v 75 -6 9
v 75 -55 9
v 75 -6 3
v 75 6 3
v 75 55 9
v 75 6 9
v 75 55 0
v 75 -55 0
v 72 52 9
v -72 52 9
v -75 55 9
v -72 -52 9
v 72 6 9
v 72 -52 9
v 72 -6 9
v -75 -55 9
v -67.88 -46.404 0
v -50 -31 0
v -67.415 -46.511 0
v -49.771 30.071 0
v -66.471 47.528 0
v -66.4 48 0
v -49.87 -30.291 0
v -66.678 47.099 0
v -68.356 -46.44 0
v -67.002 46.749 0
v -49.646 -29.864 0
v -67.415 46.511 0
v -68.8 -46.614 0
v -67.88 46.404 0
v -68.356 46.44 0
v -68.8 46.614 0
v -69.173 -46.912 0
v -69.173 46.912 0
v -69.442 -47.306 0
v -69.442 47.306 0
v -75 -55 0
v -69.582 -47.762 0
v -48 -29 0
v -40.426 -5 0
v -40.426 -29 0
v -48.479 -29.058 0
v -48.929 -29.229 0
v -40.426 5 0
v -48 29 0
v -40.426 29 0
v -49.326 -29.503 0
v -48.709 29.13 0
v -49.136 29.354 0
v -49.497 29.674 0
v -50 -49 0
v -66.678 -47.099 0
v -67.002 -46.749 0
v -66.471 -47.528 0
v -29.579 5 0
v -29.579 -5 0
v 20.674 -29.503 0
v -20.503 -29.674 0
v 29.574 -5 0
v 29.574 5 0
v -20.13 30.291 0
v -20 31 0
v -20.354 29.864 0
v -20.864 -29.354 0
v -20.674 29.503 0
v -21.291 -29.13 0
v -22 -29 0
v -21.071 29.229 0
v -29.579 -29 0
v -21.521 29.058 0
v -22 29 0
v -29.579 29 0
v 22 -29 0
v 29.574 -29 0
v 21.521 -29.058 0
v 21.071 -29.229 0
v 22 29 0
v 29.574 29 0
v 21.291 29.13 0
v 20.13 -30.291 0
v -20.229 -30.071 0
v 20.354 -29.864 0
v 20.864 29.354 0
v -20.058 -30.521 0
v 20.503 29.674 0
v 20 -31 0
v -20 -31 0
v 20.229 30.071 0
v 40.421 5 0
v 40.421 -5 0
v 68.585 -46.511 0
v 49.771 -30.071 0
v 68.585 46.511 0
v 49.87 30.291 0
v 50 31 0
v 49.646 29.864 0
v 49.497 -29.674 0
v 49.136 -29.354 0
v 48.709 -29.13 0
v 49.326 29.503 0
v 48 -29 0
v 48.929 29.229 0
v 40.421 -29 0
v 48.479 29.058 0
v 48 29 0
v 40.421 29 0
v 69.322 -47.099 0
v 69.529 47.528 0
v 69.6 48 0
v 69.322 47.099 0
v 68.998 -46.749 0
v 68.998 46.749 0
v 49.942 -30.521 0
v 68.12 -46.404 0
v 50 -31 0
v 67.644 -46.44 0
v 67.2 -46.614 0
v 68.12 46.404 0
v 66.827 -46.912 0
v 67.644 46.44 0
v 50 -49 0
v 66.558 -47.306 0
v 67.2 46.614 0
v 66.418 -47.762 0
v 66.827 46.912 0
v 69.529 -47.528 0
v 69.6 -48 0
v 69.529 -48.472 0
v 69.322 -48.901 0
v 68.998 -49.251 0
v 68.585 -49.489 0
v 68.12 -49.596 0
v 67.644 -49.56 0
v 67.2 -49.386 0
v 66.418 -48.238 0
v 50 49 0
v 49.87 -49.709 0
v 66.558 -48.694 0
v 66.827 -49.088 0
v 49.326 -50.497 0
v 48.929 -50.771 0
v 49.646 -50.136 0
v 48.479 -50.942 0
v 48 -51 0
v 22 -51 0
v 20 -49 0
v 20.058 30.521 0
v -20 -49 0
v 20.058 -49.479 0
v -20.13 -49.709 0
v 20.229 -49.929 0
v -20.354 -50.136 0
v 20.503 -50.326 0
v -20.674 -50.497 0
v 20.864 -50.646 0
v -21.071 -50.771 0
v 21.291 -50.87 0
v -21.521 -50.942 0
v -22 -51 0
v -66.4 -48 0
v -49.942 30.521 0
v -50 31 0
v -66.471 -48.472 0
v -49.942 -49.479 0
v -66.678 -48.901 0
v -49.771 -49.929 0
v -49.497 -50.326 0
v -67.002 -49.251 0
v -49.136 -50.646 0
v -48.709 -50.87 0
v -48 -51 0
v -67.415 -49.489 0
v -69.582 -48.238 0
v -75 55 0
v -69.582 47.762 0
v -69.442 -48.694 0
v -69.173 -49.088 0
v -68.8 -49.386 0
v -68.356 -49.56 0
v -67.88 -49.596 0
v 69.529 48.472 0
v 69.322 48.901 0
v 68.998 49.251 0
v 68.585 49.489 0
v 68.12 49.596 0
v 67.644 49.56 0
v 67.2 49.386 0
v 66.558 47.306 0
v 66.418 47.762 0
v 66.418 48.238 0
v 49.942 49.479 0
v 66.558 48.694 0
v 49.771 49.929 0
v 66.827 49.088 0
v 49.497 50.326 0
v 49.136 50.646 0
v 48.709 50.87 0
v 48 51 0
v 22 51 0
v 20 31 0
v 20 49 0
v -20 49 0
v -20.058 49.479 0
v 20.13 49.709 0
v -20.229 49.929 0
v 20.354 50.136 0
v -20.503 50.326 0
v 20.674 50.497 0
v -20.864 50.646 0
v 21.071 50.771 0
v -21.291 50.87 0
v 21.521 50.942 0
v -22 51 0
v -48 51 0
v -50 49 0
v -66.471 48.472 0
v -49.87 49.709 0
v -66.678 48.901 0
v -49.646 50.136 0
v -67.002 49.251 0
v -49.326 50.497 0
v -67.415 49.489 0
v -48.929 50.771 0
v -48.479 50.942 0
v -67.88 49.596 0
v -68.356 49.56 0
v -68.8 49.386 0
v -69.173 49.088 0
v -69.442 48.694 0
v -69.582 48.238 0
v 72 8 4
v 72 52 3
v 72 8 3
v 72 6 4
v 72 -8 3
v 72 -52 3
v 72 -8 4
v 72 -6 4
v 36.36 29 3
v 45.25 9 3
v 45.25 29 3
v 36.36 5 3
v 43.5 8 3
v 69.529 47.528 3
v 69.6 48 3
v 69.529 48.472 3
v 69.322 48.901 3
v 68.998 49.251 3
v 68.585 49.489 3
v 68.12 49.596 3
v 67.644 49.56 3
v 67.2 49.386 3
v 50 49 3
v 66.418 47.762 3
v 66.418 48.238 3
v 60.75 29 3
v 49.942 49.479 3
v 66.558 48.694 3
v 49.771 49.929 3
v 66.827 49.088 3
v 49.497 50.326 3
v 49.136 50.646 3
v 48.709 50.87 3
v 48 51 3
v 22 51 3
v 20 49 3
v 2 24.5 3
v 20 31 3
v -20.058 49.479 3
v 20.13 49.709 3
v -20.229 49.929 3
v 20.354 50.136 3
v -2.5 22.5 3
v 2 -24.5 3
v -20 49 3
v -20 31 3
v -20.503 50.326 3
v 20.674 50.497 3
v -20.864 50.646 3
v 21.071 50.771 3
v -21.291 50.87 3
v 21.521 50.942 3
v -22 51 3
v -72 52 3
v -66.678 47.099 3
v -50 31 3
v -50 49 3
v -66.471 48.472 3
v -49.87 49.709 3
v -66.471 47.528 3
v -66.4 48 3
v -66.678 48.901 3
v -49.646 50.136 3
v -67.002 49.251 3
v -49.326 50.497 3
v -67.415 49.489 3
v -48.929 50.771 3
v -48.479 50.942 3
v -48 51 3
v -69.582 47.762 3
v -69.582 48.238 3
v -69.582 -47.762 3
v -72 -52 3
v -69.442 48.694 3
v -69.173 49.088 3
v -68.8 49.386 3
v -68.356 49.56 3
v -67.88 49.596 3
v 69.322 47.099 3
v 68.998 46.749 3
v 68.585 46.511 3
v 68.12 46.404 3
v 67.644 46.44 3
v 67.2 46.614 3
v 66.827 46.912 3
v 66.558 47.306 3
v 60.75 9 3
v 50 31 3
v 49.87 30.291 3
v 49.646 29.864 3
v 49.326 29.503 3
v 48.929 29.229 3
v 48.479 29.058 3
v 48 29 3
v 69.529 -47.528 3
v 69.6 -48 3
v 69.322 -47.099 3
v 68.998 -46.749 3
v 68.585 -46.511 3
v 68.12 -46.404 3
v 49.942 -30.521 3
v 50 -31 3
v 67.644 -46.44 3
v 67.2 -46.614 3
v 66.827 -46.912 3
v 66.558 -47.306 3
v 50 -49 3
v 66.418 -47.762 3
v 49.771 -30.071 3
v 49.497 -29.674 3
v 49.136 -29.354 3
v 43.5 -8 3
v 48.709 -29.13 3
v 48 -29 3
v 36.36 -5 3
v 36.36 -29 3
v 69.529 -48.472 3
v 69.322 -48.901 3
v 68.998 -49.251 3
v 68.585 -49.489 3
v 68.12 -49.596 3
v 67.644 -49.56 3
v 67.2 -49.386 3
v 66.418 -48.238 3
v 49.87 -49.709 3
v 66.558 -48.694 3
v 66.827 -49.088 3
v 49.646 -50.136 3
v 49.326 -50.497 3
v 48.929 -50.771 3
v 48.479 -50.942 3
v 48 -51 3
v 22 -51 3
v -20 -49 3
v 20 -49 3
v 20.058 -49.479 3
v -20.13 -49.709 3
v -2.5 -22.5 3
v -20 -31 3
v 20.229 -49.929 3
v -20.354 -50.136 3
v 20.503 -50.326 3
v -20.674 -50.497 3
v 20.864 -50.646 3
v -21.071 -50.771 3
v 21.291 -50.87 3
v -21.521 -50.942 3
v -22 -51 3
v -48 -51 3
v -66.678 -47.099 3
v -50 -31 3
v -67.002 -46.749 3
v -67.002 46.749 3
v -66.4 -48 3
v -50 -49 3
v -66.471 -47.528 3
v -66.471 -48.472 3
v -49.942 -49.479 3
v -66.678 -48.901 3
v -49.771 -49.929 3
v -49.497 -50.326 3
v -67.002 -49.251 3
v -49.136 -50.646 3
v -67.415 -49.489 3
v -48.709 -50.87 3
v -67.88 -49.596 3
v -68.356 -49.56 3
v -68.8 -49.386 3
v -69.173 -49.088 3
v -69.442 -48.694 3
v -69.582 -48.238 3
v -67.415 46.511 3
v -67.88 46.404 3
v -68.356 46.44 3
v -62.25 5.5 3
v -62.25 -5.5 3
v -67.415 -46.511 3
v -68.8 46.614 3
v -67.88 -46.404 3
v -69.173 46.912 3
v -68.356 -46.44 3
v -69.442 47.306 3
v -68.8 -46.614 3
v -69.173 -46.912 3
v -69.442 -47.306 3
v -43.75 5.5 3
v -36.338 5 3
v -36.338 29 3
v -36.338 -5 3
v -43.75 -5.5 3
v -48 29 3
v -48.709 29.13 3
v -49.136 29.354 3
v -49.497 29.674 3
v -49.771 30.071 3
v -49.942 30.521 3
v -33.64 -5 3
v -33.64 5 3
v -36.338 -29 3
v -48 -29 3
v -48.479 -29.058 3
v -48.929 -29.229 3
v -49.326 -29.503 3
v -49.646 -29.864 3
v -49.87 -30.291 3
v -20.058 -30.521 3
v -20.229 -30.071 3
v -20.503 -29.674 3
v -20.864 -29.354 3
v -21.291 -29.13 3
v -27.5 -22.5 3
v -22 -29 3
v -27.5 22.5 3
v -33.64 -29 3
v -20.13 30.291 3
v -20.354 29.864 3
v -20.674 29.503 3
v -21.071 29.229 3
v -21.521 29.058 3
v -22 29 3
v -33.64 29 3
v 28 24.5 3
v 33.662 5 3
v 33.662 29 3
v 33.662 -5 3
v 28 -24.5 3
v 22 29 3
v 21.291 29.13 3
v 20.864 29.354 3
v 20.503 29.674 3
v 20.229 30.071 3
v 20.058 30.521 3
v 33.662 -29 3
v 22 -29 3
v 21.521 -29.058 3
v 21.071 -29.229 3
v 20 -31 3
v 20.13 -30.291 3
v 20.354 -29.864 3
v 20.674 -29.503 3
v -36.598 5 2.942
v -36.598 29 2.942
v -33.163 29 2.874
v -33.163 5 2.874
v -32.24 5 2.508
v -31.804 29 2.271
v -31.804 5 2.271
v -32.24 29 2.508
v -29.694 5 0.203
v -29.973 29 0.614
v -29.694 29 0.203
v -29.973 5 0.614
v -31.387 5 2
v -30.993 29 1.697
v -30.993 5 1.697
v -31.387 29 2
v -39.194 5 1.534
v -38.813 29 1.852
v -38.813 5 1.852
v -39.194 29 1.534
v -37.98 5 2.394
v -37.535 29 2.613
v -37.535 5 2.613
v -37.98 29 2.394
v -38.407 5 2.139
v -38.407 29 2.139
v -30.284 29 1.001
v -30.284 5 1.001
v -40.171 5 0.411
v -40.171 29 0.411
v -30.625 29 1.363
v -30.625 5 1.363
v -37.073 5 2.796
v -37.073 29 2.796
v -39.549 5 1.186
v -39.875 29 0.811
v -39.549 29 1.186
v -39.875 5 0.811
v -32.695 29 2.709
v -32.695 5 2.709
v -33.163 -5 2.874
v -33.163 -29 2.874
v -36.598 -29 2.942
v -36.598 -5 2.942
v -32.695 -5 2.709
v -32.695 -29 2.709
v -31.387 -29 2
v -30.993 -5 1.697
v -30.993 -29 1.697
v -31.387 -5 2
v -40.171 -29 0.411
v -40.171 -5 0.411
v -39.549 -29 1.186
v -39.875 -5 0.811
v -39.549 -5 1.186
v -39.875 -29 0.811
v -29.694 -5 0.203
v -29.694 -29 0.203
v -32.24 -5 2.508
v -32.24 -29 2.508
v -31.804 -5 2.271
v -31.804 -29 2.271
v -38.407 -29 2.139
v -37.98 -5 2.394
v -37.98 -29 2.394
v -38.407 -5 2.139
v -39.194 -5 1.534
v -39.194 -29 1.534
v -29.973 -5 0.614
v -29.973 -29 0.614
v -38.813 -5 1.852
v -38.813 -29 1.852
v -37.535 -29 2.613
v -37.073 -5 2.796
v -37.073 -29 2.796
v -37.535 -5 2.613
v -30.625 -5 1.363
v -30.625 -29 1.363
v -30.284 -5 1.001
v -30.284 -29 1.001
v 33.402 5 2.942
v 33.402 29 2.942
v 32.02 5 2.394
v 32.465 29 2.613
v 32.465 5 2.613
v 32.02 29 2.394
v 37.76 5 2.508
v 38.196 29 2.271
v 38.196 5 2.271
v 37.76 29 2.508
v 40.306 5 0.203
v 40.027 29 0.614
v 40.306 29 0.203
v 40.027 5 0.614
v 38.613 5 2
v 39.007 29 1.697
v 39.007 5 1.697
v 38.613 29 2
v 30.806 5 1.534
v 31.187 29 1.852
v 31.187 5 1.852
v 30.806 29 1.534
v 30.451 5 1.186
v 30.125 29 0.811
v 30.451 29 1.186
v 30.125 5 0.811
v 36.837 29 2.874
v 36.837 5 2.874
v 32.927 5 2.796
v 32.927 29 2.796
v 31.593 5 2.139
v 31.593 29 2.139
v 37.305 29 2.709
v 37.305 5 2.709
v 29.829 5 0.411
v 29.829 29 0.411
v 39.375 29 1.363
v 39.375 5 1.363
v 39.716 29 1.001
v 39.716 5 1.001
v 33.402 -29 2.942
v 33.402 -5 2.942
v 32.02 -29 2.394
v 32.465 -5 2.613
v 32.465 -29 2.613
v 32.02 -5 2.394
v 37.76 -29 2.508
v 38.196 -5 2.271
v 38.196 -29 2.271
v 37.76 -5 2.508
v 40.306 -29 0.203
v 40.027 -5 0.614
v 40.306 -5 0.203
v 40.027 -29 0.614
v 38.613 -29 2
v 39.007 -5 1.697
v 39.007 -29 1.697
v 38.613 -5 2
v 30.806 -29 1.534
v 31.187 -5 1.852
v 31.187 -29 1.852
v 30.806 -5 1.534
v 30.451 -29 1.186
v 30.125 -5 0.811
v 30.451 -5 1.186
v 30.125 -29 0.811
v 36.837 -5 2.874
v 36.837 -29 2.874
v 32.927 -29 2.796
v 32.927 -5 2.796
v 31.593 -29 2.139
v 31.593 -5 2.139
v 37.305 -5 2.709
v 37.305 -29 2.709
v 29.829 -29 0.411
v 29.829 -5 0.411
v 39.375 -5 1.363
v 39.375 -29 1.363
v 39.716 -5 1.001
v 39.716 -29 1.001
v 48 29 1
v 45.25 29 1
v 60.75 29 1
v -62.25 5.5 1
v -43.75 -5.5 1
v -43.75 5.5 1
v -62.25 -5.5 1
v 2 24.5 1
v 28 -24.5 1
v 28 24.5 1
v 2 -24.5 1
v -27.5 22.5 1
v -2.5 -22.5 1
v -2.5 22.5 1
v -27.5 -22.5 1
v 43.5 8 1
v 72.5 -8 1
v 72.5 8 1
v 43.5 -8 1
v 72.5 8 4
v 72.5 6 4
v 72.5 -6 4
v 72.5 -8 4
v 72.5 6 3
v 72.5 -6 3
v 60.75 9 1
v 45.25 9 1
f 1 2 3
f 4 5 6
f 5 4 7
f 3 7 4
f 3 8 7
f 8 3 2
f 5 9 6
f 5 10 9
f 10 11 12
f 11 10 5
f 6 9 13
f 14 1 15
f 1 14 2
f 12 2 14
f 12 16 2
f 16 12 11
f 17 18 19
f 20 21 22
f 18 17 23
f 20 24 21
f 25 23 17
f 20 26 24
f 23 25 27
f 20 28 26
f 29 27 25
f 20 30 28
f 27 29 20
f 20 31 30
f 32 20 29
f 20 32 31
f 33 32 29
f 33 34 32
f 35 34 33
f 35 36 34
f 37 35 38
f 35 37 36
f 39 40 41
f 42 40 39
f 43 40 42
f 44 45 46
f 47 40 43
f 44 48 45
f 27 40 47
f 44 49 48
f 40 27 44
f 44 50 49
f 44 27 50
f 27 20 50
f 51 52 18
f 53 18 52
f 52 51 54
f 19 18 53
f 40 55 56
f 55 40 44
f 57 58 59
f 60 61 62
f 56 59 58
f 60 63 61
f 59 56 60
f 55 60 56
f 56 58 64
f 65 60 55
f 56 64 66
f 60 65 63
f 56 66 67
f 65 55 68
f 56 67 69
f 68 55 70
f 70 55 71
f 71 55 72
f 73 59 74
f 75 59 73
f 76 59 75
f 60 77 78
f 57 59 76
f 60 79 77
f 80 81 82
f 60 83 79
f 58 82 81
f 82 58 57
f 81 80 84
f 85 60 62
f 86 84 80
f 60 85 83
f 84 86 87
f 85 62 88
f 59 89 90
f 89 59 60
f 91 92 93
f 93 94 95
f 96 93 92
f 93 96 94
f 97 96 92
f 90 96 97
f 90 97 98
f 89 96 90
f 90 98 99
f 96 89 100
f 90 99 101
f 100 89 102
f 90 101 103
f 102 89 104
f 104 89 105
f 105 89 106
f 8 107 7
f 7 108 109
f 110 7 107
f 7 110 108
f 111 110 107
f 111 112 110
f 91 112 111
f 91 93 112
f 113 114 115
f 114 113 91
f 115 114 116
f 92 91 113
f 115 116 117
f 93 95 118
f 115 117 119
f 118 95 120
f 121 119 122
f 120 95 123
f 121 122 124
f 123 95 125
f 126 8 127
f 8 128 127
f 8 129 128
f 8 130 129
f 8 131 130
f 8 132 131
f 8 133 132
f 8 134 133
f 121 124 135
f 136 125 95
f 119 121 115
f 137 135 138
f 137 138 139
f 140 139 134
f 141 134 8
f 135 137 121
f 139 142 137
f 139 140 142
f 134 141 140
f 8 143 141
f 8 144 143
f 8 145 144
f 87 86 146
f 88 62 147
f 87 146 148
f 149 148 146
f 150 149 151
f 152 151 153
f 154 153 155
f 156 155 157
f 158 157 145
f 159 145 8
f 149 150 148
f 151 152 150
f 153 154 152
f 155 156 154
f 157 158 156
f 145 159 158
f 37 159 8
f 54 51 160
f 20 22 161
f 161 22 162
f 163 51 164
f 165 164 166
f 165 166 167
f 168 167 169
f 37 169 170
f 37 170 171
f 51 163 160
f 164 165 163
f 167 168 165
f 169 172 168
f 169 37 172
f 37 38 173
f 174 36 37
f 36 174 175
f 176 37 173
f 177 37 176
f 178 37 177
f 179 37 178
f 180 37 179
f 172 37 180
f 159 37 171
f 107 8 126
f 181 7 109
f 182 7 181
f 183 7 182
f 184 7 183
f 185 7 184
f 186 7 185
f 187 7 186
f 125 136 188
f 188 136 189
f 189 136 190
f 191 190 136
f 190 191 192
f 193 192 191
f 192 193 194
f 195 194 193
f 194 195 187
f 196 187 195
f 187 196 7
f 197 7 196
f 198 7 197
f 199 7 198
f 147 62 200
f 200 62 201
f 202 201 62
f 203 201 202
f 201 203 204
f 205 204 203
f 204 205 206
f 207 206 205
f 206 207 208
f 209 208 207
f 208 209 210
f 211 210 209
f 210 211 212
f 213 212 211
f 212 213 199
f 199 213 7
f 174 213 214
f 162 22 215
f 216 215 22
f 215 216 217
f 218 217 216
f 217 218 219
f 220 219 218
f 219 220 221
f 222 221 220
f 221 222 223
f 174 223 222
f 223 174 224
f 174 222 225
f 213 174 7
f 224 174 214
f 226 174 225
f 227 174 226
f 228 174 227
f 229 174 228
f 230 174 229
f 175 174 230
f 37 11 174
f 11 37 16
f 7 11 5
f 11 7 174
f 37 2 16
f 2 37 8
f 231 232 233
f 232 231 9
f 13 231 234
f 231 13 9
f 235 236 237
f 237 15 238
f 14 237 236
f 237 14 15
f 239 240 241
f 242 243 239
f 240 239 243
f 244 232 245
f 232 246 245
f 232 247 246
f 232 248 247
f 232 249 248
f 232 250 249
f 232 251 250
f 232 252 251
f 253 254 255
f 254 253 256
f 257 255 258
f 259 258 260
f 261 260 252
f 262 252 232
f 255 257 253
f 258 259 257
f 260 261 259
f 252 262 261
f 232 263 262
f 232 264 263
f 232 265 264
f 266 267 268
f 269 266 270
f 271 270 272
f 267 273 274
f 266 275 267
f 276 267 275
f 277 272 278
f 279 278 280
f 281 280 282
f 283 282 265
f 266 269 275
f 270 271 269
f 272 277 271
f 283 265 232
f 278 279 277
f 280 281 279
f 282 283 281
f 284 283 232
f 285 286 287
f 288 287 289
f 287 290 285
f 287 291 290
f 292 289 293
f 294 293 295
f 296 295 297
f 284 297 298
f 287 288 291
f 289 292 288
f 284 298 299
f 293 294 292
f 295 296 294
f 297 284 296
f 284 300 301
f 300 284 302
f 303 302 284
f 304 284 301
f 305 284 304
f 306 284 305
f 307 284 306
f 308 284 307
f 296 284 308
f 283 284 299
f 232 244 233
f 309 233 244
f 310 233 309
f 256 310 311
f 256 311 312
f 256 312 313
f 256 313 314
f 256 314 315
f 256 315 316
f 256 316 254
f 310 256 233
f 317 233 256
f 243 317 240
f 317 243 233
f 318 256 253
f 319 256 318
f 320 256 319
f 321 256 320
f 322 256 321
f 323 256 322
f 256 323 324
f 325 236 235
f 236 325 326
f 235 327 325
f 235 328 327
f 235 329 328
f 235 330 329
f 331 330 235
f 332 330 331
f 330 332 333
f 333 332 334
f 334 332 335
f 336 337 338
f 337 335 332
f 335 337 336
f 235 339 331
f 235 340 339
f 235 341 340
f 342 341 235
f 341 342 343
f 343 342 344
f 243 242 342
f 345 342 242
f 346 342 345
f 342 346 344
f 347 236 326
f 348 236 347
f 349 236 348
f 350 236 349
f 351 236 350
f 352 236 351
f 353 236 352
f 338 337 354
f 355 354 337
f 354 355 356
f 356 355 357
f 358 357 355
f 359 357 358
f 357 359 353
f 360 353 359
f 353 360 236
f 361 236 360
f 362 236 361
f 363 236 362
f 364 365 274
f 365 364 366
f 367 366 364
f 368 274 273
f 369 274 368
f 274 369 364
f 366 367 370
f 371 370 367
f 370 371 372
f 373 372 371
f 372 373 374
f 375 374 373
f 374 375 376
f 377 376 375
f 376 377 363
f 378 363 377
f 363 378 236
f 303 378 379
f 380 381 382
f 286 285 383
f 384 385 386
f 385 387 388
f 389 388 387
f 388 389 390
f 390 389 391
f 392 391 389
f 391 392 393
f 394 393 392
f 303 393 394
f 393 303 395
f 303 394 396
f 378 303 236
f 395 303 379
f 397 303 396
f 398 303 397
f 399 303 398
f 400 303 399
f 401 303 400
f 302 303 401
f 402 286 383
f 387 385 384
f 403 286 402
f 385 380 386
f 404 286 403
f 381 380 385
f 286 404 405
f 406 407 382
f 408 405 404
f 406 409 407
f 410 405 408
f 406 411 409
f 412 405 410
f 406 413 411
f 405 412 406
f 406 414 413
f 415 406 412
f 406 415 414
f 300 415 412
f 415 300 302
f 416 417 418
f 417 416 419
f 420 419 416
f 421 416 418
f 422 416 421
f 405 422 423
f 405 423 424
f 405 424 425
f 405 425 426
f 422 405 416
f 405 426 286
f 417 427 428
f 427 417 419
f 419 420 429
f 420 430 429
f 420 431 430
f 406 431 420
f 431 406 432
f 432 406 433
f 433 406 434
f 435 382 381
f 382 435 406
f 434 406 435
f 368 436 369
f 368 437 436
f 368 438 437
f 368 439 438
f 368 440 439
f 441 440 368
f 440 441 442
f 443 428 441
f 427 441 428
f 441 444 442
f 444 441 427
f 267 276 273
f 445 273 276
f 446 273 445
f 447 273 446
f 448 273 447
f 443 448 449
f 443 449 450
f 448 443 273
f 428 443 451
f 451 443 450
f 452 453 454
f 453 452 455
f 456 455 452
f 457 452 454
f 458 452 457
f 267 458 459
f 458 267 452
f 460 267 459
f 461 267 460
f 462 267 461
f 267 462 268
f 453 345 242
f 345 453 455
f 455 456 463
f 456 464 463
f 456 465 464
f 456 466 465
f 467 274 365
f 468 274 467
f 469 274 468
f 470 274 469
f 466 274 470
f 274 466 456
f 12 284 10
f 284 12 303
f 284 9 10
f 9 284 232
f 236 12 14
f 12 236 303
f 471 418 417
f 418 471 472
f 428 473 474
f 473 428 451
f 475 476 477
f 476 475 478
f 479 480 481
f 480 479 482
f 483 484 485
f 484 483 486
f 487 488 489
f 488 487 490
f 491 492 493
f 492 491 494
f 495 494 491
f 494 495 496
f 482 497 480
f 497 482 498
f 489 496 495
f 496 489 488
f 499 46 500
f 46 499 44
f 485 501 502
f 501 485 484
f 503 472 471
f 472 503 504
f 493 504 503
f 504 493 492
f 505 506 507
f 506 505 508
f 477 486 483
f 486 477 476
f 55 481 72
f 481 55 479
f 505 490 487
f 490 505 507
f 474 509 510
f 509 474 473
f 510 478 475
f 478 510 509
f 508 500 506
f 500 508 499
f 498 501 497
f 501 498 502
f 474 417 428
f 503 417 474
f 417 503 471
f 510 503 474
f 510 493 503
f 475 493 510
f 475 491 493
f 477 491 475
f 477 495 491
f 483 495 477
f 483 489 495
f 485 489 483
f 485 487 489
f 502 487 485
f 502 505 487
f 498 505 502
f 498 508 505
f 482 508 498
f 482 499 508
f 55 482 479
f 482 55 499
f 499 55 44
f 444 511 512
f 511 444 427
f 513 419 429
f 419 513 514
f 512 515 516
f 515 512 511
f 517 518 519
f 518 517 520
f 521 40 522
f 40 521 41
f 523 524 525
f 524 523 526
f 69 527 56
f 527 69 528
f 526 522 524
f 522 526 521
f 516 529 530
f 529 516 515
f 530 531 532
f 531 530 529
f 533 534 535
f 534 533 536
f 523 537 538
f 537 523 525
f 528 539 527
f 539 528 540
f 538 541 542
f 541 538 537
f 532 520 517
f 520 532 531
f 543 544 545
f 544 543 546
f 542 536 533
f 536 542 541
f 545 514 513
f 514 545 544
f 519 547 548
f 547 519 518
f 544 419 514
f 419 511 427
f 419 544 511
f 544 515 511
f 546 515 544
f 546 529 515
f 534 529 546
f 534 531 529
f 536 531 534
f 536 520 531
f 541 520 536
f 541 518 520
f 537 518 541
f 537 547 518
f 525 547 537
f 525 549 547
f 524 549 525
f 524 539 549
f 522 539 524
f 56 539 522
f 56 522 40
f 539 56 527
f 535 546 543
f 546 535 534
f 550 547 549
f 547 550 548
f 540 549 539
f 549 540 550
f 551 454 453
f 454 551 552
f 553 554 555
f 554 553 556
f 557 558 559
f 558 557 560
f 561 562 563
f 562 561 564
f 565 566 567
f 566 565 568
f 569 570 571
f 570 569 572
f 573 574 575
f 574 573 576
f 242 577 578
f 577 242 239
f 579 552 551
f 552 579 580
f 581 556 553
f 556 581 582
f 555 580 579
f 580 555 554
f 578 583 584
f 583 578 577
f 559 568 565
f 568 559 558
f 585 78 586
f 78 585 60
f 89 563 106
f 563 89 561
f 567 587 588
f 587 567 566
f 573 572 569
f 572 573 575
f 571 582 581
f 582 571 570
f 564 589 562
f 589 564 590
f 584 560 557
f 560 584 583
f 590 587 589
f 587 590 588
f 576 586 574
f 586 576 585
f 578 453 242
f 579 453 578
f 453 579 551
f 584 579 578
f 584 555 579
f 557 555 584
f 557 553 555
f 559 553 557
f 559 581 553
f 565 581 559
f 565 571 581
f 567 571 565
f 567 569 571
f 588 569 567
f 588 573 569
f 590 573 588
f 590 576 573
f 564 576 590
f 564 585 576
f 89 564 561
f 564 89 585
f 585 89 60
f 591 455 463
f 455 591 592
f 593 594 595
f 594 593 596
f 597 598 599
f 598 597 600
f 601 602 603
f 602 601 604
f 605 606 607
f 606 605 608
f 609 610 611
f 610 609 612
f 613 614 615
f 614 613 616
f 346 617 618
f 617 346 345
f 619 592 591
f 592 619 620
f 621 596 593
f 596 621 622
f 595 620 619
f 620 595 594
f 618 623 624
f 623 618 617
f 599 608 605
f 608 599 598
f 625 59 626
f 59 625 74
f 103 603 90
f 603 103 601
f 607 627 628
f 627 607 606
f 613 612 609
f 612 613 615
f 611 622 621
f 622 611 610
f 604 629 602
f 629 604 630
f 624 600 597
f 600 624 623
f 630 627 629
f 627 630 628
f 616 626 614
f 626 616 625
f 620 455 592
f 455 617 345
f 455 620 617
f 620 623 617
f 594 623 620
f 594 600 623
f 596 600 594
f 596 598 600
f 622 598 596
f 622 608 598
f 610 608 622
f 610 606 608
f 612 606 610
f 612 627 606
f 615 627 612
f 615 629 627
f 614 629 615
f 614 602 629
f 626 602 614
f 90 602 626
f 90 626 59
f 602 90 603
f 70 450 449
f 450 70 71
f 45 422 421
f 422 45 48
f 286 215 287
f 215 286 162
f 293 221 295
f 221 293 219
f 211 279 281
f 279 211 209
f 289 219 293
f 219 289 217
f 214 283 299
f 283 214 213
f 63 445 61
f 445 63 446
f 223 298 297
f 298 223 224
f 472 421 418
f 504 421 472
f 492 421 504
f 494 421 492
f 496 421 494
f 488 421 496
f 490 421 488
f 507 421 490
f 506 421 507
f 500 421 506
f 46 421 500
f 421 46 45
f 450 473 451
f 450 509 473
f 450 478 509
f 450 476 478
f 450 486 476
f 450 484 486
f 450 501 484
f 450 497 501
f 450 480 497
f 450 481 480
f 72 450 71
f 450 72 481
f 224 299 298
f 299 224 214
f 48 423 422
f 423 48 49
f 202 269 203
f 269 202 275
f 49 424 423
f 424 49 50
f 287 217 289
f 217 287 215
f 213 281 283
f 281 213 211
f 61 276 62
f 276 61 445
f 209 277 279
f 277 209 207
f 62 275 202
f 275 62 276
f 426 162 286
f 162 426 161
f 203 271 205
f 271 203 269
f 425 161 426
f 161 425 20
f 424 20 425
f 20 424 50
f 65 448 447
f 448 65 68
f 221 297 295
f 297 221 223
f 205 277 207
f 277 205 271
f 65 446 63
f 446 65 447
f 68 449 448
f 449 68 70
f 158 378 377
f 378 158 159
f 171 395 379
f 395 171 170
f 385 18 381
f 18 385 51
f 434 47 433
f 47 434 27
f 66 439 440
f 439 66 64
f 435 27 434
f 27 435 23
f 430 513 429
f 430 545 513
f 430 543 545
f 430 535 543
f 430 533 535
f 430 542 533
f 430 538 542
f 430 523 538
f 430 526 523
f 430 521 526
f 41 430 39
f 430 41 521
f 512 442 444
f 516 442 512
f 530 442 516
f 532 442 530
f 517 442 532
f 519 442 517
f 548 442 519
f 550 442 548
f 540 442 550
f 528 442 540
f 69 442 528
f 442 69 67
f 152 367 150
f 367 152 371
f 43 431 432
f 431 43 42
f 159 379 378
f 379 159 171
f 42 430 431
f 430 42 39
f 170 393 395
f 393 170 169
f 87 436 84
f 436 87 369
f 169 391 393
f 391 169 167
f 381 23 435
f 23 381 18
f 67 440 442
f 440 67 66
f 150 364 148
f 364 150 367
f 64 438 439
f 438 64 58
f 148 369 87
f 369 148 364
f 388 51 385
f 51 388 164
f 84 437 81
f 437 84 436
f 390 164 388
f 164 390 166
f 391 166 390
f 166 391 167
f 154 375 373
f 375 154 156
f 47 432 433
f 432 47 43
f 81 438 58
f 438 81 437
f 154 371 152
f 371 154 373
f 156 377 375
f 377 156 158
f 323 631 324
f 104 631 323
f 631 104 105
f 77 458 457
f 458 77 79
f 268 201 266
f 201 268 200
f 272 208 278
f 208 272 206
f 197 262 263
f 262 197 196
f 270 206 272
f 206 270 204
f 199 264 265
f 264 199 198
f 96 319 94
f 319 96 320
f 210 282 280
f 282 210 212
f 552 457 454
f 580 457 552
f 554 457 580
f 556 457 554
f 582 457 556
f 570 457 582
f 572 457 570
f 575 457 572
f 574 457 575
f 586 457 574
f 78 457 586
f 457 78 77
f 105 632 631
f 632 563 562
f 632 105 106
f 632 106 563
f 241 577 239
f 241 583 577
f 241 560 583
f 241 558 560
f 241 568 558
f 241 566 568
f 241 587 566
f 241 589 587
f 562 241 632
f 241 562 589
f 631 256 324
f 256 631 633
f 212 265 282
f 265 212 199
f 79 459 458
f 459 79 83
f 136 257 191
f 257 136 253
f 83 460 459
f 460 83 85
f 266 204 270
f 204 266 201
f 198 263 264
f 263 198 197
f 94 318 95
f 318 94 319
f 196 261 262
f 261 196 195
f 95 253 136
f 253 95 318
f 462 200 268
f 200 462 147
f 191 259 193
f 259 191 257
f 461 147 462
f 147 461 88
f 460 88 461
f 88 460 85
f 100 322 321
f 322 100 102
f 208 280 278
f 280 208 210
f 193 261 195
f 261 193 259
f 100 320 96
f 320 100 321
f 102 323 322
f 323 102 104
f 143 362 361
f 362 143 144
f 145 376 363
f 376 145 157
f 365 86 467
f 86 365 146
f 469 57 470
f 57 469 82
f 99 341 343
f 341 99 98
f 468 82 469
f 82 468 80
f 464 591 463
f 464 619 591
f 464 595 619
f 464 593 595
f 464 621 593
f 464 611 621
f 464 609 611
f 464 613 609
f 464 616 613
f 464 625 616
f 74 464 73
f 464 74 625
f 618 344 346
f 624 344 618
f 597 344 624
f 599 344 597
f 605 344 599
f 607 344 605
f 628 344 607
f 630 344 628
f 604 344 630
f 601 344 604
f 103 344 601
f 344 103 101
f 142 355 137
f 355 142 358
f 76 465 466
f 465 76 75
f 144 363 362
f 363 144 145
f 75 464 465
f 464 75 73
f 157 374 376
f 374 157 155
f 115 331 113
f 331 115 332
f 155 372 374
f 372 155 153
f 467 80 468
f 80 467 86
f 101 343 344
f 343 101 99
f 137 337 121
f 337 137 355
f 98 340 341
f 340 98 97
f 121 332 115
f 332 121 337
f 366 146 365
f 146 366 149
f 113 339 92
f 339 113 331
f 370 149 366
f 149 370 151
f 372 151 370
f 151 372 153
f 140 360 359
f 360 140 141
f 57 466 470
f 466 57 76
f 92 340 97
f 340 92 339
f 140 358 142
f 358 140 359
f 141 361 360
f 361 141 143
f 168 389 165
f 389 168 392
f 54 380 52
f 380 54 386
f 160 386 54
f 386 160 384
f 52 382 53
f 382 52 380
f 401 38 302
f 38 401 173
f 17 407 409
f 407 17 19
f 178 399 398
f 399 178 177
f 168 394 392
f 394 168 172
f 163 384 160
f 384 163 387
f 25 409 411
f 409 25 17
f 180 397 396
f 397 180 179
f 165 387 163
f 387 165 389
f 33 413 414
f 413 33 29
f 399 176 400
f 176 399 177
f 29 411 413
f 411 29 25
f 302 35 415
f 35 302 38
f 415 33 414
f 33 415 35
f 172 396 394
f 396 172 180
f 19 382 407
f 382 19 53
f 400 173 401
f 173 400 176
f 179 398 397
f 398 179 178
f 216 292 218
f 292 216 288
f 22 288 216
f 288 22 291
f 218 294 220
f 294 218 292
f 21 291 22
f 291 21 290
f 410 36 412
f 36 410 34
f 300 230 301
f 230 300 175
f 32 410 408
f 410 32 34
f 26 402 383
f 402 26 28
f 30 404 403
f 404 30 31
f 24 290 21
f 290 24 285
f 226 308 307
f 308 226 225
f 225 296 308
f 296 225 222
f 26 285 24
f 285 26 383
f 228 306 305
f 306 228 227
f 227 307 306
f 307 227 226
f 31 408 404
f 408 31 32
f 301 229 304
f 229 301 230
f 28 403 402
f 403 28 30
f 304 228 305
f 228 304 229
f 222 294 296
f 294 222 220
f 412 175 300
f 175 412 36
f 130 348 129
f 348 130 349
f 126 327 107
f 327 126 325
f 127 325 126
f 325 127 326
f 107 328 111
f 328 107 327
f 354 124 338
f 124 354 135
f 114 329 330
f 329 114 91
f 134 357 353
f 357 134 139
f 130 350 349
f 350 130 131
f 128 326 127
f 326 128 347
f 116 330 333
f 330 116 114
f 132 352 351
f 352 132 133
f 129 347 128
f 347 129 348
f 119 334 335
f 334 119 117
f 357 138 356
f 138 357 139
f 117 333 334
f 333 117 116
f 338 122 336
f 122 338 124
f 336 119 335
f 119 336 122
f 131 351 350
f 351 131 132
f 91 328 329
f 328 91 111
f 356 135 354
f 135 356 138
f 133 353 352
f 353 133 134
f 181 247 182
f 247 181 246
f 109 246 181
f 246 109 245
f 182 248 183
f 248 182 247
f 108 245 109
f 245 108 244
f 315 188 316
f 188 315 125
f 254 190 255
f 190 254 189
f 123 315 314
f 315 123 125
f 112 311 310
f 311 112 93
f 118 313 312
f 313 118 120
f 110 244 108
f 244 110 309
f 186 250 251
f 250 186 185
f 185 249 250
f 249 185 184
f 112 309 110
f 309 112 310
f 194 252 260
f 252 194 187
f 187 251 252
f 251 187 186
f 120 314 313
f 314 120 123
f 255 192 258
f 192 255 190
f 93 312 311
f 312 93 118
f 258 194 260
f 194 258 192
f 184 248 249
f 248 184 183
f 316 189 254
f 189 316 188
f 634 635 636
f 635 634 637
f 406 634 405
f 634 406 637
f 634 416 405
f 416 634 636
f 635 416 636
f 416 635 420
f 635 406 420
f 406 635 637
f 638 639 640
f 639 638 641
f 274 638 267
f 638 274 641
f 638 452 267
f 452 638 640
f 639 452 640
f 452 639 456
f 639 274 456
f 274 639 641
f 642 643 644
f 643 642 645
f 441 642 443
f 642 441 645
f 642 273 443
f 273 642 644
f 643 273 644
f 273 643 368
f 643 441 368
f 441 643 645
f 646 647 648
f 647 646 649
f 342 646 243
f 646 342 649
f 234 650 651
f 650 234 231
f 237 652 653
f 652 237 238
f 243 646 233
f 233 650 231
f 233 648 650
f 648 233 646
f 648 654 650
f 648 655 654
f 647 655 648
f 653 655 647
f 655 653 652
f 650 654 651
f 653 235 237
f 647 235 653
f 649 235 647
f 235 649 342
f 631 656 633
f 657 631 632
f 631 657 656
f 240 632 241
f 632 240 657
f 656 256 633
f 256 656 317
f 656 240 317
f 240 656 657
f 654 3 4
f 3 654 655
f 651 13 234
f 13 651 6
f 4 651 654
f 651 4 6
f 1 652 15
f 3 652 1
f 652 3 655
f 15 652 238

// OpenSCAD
// minibot chassis — parametric, invertible, fully enclosed
//
// Two identical tray plates that join open-face to open-face into a
// closed box. Each plate has a 3 mm floor + 6 mm half-walls; together
// they form an 18 mm tall enclosure with a 12 mm internal cavity.
//
// Motors mount with shafts pointing OUTWARD toward the side walls.
// Wheels are mounted on the shafts close to (but inside) the side
// walls; they poke through cutouts in the top and bottom plates only,
// so nothing protrudes laterally.
//
//   openscad --export-format=stl -o plate.stl docs/cad/chassis.scad
//
// The chassis is invertible — print this same shape twice.

// ─── parameters ──────────────────────────────────────────────────────

// Outer footprint
plate_length = 150;     // mm — front-to-back (extra length to fit TP4056 in the back)
plate_width  = 110;     // mm — side-to-side
plate_thick  = 3;       // mm — flat floor thickness

// Walls — 6 mm tall on each plate, meeting in the cavity centreline
wall_thick       = 3;
wall_half_height = 6;

// N20 motor body (steel can only)
motor_diameter   = 12.2;
motor_length     = 25;
motor_axle_pitch = 70;  // mm — front-rear motor spacing
motor_track      = 35;  // mm — side-to-side motor spacing (centre to centre)

// Pocket geometry (half-cylinder cut into the plate)
pocket_depth     = motor_diameter / 2;
pocket_clearance = 0.3;

// Wheels (SLT20 33×20mm). Wheels mount on the shafts pointing OUTWARD
// from the motor body, hub flush with the motor's gearbox face, so
// the wheel's Y centre is one half-width past the motor's outer face.
wheel_diameter  = 33;
wheel_width     = 20;
wheel_clearance = 1.0;

// Electronics
esp_length = 49;
esp_width  = 26;
esp_pocket_depth = 2;

driver_length = 18.5;   // DRV8833 carrier (Pololu)
driver_width  = 11;
driver_pocket_depth = 2;

battery_length = 45;
battery_width  = 25;
battery_pocket_depth = 2;

// GY-521 (MPU6050) IMU breakout
imu_length = 20;
imu_width  = 15.5;
imu_pocket_depth = 2;

// TP4056 USB-C charging + protection board (PCB 26.5mm, +2.5mm for the USB-C connector overhang)
tp4056_length = 29;
tp4056_width  = 16;
tp4056_pocket_depth = 2;

// Corner mount holes (M3 heat-set inserts)
mount_hole_d     = 3.2;
mount_hole_inset = 7;

// Micro-USB slot in the front wall
usb_slot_width  = 12;
usb_slot_height = 6;

// Render resolution
$fa = 4;
$fs = 0.5;


// ─── derived geometry ────────────────────────────────────────────────

motor_pocket_d = motor_diameter + pocket_clearance;

// Motor body Y-position (motor centre). Body extends ±motor_length/2 in Y.
motor_center_y = motor_track / 2;

// Wheel Y-position: shaft points outward from motor, wheel hub flush
// with motor's outer face, so wheel centre is at:
//   motor_center_y + motor_length/2 + wheel_width/2
wheel_center_y = motor_center_y + motor_length / 2 + wheel_width / 2;

motor_positions = [
  [-motor_axle_pitch / 2,  motor_center_y],   // front-left
  [-motor_axle_pitch / 2, -motor_center_y],   // front-right
  [ motor_axle_pitch / 2,  motor_center_y],   // rear-left
  [ motor_axle_pitch / 2, -motor_center_y],   // rear-right
];

wheel_positions = [
  [-motor_axle_pitch / 2,  wheel_center_y],
  [-motor_axle_pitch / 2, -wheel_center_y],
  [ motor_axle_pitch / 2,  wheel_center_y],
  [ motor_axle_pitch / 2, -wheel_center_y],
];

wheel_cutout_x = 30;   // wheel cross-section at plate level (~28mm) + margin
wheel_cutout_y = wheel_width + 2;


// ─── modules ─────────────────────────────────────────────────────────

module motor_pocket(pos)
{
  // Half-cylinder along Y axis cut into the floor
  translate([pos[0], pos[1], plate_thick - pocket_depth])
    rotate([90, 0, 0])
      cylinder(d=motor_pocket_d, h=motor_length, center=true);
}

module wheel_cutout(pos)
{
  // Rounded-rectangle slot through the plate
  translate([pos[0], pos[1], -1])
    linear_extrude(plate_thick + 2)
      offset(r=2)
        square([wheel_cutout_x - 4, wheel_cutout_y - 4], center=true);
}

module rect_pocket(w, l, depth, x=0, y=0)
{
  translate([x, y, plate_thick - depth])
    linear_extrude(depth + 1)
      square([l, w], center=true);
}

module mount_holes()
{
  for (sx = [-1, 1]) for (sy = [-1, 1])
    translate([
      sx * (plate_length / 2 - mount_hole_inset),
      sy * (plate_width  / 2 - mount_hole_inset),
      -1
    ])
      cylinder(d=mount_hole_d, h=plate_thick + wall_half_height + 2);
}

module usb_slot()
{
  // Slot through the back wall (+X), centred. The ESP32's micro-USB
  // connector reaches it through a short internal cable / extension.
  translate([
    plate_length / 2 - wall_thick - 0.1,
    -usb_slot_width / 2,
    plate_thick + (wall_half_height - usb_slot_height) / 2
  ])
    cube([wall_thick + 0.2, usb_slot_width, usb_slot_height]);
}

module plate()
{
  difference() {
    union() {
      // Floor
      translate([-plate_length / 2, -plate_width / 2, 0])
        cube([plate_length, plate_width, plate_thick]);
      // Walls
      difference() {
        translate([-plate_length / 2, -plate_width / 2, 0])
          cube([plate_length, plate_width, plate_thick + wall_half_height]);
        translate([
          -plate_length / 2 + wall_thick,
          -plate_width  / 2 + wall_thick,
          plate_thick
        ])
          cube([
            plate_length - 2 * wall_thick,
            plate_width  - 2 * wall_thick,
            wall_half_height + 1
          ]);
      }
    }

    // Motor half-pockets in the floor
    for (p = motor_positions) motor_pocket(p);

    // Wheel cutouts through the plate
    for (p = wheel_positions) wheel_cutout(p);

    // Electronics recesses (rotated for balanced weight distribution):
    //   - TB6612FNG up front between the front wall and the front motor pair
    //   - ESP32 + battery rotated 90° (long axis along Y), side-by-side in
    //     the central X strip between the motor pairs
    //   - TP4056 USB-C charge board against the back wall (USB-C aligned
    //     with the slot in the wall)
    //   - GY-521 IMU just inboard of the TP4056 in the back strip
    rect_pocket(driver_width,  driver_length,  driver_pocket_depth,  x=-53, y=0);
    rect_pocket(esp_length,    esp_width,      esp_pocket_depth,     x=+15, y=0);
    rect_pocket(battery_length, battery_width, battery_pocket_depth, x=-15, y=0);
    rect_pocket(tp4056_width,  tp4056_length,  tp4056_pocket_depth,  x=+58, y=0);
    rect_pocket(imu_length,    imu_width,      imu_pocket_depth,     x=+53, y=+19);

    // USB slot through the front wall
    usb_slot();

    // Corner mount holes
    mount_holes();
  }
}


// ─── render ──────────────────────────────────────────────────────────

plate();
